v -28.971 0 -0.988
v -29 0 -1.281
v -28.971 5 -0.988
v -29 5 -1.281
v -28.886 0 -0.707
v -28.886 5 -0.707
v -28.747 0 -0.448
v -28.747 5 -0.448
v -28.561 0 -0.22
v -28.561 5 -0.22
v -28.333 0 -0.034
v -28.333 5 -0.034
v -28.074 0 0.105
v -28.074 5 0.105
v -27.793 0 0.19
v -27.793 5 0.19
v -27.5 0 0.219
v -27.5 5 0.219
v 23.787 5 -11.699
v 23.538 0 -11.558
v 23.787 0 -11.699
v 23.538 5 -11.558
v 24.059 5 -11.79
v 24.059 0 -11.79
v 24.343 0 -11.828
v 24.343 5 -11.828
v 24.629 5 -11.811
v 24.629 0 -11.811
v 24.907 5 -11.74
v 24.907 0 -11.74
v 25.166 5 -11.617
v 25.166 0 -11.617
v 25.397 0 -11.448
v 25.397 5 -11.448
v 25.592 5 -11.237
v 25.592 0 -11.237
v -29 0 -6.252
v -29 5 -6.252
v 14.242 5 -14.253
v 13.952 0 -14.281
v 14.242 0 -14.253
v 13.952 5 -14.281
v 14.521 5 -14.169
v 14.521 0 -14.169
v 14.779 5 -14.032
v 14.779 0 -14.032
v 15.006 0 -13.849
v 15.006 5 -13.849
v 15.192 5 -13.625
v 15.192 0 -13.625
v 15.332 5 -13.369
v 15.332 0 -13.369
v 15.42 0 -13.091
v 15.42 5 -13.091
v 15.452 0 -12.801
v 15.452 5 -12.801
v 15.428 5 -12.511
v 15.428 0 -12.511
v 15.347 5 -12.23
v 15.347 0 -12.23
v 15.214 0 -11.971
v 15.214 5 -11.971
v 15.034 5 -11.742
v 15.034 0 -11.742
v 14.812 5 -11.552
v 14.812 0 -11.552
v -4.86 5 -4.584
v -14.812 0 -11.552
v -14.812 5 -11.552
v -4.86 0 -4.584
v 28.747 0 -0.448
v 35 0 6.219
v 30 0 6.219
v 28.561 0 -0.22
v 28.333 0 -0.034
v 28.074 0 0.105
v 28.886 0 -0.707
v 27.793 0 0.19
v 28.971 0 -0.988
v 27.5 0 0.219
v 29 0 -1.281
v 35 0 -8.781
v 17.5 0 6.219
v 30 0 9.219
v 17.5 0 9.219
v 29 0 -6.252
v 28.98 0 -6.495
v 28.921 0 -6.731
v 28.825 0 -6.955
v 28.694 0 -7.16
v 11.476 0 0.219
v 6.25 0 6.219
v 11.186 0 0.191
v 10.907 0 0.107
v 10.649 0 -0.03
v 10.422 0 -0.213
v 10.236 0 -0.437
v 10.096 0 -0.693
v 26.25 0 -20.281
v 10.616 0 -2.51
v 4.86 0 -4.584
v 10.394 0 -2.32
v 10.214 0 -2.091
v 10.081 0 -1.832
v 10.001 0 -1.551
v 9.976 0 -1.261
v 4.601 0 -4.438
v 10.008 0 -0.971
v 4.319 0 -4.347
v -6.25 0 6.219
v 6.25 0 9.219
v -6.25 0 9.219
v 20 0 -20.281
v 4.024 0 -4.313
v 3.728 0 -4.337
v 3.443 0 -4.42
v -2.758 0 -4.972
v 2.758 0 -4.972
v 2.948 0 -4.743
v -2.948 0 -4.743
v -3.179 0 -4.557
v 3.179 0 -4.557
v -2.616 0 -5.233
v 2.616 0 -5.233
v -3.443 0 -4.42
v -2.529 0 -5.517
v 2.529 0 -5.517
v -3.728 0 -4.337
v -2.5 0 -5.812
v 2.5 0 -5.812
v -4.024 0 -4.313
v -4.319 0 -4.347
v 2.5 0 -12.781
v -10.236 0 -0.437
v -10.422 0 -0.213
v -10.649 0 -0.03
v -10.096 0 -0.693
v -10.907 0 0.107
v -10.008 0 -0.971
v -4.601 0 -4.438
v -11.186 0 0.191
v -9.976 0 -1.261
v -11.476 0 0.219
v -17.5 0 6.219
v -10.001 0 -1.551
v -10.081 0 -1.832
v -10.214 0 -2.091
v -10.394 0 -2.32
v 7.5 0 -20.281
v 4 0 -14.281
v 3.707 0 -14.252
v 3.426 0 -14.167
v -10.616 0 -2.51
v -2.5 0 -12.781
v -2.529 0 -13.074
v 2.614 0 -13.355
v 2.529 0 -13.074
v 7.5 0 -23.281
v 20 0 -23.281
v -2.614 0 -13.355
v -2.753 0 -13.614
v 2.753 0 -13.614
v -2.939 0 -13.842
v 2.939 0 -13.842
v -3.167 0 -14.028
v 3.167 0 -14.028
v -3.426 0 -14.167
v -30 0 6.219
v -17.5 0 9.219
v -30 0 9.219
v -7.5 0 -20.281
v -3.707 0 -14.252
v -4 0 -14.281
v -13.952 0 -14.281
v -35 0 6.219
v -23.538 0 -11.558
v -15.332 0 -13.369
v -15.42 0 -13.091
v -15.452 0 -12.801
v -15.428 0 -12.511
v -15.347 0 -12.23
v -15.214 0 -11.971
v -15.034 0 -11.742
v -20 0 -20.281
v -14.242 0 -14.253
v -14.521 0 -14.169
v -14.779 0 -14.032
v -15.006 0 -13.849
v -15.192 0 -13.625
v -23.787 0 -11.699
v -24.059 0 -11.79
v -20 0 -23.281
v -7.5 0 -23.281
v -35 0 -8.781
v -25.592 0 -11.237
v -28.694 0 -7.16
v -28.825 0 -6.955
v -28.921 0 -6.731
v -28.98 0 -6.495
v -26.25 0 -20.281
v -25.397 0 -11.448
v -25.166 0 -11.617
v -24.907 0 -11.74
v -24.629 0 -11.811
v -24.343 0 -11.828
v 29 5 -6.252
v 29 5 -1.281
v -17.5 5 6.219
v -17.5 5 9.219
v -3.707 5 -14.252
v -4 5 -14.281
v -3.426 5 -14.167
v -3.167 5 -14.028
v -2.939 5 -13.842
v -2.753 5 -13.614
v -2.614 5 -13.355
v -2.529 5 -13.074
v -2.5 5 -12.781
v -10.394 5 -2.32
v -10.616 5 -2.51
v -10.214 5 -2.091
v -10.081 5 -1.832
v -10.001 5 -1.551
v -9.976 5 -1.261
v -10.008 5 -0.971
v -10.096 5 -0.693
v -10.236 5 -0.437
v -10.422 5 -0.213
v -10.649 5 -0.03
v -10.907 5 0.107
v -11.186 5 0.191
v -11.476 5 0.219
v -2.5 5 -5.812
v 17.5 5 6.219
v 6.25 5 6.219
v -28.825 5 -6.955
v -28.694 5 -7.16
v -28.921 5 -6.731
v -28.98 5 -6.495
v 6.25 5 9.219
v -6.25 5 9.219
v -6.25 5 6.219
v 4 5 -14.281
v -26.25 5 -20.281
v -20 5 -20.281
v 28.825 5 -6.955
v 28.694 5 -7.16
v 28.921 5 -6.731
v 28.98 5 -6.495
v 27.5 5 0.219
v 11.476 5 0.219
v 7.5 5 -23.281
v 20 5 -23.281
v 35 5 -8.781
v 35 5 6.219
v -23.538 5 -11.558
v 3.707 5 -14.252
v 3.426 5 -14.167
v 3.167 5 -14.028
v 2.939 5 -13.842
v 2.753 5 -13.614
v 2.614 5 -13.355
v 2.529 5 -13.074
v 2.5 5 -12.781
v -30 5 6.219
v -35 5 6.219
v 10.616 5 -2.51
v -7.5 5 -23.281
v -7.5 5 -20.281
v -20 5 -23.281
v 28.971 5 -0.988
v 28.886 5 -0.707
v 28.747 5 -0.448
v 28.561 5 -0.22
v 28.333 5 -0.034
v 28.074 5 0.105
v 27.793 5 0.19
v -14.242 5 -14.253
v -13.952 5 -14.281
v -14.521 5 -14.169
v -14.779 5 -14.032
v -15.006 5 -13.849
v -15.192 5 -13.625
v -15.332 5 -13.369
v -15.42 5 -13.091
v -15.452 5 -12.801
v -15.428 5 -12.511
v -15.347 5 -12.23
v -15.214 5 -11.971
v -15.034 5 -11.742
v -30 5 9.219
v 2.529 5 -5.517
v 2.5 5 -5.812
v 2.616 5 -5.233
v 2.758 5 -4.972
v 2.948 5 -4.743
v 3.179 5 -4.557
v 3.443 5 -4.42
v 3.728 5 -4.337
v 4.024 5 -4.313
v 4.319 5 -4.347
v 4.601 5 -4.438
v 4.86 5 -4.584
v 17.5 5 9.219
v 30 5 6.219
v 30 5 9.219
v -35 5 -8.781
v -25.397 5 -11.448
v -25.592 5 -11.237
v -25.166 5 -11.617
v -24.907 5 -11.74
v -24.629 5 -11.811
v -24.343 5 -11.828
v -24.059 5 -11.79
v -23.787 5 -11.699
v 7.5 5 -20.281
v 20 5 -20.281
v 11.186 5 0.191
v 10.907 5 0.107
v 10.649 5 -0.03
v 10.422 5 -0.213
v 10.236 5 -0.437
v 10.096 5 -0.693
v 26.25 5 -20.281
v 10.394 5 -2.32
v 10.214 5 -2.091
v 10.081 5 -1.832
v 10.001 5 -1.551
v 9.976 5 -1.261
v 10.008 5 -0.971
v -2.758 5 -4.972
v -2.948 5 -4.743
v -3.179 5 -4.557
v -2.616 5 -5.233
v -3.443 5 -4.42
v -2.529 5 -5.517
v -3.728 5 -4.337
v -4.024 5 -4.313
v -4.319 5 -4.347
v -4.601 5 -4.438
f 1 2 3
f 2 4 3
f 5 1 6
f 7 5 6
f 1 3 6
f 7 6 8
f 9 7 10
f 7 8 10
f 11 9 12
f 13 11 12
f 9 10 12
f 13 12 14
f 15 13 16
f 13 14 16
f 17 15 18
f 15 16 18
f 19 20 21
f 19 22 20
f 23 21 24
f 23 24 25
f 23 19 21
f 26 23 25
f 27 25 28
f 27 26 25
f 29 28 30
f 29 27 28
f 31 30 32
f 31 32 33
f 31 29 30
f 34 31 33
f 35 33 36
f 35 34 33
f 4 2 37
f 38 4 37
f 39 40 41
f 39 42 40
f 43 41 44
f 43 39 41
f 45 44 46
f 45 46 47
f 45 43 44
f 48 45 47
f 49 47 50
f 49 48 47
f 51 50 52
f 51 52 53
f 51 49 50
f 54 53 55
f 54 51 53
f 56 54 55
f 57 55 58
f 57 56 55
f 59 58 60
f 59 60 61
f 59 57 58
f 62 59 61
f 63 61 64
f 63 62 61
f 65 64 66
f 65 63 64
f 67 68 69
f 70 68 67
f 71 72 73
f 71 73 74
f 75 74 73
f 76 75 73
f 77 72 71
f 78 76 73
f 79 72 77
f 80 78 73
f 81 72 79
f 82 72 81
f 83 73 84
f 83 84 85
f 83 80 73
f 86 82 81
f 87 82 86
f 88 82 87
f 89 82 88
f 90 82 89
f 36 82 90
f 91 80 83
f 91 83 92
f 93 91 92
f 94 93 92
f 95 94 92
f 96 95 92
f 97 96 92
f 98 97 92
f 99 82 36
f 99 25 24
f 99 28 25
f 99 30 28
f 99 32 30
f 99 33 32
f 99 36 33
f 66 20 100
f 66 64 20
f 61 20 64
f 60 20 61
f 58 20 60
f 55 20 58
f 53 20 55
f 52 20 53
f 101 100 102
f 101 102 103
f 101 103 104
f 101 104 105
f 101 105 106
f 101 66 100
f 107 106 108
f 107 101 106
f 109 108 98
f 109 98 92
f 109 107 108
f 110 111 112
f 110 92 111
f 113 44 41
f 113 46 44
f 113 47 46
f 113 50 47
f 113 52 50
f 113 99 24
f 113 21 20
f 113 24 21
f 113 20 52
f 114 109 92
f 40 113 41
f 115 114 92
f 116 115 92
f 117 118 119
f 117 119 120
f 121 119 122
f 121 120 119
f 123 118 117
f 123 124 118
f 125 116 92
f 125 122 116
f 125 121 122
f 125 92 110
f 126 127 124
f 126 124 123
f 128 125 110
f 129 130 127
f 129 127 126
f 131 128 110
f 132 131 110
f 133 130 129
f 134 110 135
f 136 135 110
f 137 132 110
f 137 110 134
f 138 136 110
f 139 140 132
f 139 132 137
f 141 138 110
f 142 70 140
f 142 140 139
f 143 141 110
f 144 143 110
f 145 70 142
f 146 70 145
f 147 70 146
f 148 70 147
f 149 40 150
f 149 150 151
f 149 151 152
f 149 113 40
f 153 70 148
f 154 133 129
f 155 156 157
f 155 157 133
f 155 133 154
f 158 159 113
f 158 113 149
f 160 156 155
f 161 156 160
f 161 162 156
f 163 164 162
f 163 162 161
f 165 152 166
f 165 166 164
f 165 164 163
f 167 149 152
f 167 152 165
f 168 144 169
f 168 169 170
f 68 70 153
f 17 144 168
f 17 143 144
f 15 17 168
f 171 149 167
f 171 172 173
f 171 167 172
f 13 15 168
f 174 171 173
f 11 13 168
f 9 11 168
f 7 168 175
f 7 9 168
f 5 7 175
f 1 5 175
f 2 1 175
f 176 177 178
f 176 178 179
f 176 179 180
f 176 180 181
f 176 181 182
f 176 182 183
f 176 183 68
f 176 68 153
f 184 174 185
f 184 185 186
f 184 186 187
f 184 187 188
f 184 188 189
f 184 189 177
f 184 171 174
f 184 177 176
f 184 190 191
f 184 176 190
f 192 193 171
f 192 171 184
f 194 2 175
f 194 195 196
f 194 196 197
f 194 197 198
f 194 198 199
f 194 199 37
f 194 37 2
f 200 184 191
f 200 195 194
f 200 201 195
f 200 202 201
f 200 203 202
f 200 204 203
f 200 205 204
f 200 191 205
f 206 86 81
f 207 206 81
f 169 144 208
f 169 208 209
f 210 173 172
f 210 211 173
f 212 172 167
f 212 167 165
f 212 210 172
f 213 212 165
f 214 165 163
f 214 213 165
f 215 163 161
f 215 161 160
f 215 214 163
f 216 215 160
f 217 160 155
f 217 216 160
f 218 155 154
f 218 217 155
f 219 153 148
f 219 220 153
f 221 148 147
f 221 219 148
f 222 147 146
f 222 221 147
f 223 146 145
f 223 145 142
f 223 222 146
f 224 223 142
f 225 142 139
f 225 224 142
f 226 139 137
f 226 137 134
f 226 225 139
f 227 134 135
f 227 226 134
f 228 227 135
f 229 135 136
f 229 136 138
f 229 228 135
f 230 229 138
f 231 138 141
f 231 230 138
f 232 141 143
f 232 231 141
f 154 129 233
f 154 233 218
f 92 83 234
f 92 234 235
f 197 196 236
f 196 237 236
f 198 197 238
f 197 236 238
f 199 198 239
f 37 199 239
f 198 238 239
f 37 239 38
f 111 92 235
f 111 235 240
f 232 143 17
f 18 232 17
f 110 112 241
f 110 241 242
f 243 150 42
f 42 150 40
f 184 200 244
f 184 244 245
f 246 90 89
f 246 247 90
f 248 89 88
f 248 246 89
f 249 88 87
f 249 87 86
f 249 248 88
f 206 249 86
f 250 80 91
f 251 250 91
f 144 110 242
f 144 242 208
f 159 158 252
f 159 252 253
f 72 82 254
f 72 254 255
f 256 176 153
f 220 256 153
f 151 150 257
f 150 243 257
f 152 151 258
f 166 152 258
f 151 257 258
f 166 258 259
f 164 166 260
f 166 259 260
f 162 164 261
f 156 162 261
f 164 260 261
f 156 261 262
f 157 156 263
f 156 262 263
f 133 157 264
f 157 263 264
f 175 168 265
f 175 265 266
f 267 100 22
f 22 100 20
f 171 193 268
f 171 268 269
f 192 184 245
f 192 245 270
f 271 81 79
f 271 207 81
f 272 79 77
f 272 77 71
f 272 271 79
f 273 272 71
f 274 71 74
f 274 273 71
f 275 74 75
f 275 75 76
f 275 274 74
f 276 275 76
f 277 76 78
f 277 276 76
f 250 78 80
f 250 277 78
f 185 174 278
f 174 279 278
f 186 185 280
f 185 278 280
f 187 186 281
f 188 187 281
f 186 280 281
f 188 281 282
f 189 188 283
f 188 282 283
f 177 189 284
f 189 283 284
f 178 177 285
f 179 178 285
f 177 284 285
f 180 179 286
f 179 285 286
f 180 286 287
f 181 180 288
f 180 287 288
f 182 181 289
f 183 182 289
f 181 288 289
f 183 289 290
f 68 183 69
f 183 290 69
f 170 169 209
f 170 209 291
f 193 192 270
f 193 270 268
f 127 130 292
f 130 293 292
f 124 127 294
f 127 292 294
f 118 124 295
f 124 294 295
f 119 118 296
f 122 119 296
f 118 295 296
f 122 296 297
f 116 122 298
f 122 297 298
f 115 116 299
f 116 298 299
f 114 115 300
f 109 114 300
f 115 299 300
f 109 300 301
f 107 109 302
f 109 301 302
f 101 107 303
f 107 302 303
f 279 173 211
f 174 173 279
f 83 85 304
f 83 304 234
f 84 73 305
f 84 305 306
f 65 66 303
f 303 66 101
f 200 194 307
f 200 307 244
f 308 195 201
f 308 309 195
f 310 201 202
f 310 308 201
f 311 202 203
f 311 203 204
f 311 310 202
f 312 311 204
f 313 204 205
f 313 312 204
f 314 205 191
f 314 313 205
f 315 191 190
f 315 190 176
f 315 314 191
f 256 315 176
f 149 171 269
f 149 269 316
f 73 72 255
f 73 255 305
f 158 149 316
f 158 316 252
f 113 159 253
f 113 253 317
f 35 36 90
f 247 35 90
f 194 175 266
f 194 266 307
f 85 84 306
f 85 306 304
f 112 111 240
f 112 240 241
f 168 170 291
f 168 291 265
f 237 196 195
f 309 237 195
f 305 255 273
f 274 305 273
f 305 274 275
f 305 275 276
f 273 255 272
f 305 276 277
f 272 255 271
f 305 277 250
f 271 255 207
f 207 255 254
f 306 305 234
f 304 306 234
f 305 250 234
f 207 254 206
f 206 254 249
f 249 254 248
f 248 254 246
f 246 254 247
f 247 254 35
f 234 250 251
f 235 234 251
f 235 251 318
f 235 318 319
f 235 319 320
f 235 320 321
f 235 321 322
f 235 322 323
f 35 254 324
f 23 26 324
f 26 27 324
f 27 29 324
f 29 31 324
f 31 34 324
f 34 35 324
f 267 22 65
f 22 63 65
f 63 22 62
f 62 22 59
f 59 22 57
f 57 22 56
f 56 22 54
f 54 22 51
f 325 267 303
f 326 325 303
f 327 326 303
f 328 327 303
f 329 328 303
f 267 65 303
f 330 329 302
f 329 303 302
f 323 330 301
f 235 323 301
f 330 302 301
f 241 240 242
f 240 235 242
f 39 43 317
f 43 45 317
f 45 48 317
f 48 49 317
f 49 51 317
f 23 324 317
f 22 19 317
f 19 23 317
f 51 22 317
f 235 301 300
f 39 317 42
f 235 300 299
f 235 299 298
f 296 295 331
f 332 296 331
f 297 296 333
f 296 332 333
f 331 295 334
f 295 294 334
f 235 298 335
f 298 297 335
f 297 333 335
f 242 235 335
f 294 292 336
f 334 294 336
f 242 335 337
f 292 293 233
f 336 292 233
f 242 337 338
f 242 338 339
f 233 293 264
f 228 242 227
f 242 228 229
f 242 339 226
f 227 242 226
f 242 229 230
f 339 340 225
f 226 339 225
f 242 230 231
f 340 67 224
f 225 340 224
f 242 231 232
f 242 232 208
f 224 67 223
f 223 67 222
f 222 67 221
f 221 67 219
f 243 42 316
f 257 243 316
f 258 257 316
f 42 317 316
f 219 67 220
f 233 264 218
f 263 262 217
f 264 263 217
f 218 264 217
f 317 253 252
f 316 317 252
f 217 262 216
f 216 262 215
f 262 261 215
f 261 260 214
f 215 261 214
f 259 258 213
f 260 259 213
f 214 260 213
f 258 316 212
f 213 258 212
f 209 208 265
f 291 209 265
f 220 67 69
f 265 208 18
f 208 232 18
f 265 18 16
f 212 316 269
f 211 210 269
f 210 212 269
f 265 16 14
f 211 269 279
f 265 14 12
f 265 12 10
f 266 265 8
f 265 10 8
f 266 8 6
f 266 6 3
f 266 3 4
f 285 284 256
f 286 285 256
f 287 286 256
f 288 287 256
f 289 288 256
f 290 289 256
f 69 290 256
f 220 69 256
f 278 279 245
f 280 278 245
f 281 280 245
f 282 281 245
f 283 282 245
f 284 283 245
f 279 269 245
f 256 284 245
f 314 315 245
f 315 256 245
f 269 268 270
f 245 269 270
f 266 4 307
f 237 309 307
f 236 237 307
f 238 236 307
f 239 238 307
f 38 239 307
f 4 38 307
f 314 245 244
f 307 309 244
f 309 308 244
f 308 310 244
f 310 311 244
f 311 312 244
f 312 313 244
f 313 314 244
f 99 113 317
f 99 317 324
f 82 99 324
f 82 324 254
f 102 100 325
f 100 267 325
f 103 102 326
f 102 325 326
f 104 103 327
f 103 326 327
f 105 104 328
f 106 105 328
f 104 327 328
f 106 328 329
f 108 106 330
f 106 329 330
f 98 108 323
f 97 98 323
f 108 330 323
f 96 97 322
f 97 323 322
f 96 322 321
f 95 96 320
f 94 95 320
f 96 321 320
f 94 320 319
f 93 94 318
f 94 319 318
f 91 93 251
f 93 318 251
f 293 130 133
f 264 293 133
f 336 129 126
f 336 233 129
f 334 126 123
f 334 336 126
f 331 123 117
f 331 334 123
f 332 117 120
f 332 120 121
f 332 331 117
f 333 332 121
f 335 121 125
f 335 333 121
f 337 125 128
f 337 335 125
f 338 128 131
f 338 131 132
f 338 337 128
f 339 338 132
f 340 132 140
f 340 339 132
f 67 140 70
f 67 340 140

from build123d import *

# Parameters (mm, degrees)
EXTRUDE_1_DEPTH = 5
FILLET_1_R      = 1.5


with BuildPart() as part:
    # 草图1 → 凸台-拉伸1 (new body)
    with BuildSketch(Plane(origin=(0, 0, 0), x_dir=(1, 0, 0), z_dir=(0, 1, 0))):
        Polygon((6.25, -9.219059406), (-6.25, -9.219059406), (-6.25, -6.219059406), (-17.5, -6.219059406), (-17.5, -9.219059406), (-30, -9.219059406), (-30, -6.219059406), (-35, -6.219059406), (-35, 8.780940594), (-26.25, 20.280940594), (-20, 20.280940594), (-20, 23.280940594), (-7.5, 23.280940594), (-7.5, 20.280940594), (7.5, 20.280940594), (7.5, 23.280940594), (20, 23.280940594), (20, 20.280940594), (26.25, 20.280940594), (35, 8.780940594), (35, -6.219059406), (30, -6.219059406), (30, -9.219059406), (17.5, -9.219059406), (17.5, -6.219059406), (6.25, -6.219059406), align=None)
        Polygon((-29, 6.757846183), (-24.718664622, 12.384744108), (-6.718567757, -0.219059406), (-29, -0.219059406), align=None, mode=Mode.SUBTRACT)
        Polygon((-18.709479877, 14.280940594), (-2.5, 2.930940594), (-2.5, 14.280940594), align=None, mode=Mode.SUBTRACT)
        Polygon((2.5, 14.280940594), (18.709479877, 14.280940594), (2.5, 2.930940594), align=None, mode=Mode.SUBTRACT)
        Polygon((6.718567757, -0.219059406), (24.718664622, 12.384744108), (29, 6.757846183), (29, -0.219059406), align=None, mode=Mode.SUBTRACT)
    extrude(amount=EXTRUDE_1_DEPTH)

    # 圆角1
    fillet_1_edges = [part.edges().sort_by_distance(p)[0] for p in [
        (29, 2.5, 0.219059406),
        (29, 2.5, -6.757846183),
        (24.718664622, 2.5, -12.384744108),
        (-2.5, 2.5, -14.280940594),
        (-18.709479877, 2.5, -14.280940594),
        (-2.5, 2.5, -2.930940594),
        (-6.718567757, 2.5, 0.219059406),
        (-24.718664622, 2.5, -12.384744108),
        (-29, 2.5, -6.757846183),
        (-29, 2.5, 0.219059406),
        (2.5, 2.5, -14.280940594),
        (2.5, 2.5, -2.930940594),
        (18.709479877, 2.5, -14.280940594),
        (6.718567757, 2.5, 0.219059406),
    ]]
    fillet(fillet_1_edges, radius=FILLET_1_R)


solid = part.part
